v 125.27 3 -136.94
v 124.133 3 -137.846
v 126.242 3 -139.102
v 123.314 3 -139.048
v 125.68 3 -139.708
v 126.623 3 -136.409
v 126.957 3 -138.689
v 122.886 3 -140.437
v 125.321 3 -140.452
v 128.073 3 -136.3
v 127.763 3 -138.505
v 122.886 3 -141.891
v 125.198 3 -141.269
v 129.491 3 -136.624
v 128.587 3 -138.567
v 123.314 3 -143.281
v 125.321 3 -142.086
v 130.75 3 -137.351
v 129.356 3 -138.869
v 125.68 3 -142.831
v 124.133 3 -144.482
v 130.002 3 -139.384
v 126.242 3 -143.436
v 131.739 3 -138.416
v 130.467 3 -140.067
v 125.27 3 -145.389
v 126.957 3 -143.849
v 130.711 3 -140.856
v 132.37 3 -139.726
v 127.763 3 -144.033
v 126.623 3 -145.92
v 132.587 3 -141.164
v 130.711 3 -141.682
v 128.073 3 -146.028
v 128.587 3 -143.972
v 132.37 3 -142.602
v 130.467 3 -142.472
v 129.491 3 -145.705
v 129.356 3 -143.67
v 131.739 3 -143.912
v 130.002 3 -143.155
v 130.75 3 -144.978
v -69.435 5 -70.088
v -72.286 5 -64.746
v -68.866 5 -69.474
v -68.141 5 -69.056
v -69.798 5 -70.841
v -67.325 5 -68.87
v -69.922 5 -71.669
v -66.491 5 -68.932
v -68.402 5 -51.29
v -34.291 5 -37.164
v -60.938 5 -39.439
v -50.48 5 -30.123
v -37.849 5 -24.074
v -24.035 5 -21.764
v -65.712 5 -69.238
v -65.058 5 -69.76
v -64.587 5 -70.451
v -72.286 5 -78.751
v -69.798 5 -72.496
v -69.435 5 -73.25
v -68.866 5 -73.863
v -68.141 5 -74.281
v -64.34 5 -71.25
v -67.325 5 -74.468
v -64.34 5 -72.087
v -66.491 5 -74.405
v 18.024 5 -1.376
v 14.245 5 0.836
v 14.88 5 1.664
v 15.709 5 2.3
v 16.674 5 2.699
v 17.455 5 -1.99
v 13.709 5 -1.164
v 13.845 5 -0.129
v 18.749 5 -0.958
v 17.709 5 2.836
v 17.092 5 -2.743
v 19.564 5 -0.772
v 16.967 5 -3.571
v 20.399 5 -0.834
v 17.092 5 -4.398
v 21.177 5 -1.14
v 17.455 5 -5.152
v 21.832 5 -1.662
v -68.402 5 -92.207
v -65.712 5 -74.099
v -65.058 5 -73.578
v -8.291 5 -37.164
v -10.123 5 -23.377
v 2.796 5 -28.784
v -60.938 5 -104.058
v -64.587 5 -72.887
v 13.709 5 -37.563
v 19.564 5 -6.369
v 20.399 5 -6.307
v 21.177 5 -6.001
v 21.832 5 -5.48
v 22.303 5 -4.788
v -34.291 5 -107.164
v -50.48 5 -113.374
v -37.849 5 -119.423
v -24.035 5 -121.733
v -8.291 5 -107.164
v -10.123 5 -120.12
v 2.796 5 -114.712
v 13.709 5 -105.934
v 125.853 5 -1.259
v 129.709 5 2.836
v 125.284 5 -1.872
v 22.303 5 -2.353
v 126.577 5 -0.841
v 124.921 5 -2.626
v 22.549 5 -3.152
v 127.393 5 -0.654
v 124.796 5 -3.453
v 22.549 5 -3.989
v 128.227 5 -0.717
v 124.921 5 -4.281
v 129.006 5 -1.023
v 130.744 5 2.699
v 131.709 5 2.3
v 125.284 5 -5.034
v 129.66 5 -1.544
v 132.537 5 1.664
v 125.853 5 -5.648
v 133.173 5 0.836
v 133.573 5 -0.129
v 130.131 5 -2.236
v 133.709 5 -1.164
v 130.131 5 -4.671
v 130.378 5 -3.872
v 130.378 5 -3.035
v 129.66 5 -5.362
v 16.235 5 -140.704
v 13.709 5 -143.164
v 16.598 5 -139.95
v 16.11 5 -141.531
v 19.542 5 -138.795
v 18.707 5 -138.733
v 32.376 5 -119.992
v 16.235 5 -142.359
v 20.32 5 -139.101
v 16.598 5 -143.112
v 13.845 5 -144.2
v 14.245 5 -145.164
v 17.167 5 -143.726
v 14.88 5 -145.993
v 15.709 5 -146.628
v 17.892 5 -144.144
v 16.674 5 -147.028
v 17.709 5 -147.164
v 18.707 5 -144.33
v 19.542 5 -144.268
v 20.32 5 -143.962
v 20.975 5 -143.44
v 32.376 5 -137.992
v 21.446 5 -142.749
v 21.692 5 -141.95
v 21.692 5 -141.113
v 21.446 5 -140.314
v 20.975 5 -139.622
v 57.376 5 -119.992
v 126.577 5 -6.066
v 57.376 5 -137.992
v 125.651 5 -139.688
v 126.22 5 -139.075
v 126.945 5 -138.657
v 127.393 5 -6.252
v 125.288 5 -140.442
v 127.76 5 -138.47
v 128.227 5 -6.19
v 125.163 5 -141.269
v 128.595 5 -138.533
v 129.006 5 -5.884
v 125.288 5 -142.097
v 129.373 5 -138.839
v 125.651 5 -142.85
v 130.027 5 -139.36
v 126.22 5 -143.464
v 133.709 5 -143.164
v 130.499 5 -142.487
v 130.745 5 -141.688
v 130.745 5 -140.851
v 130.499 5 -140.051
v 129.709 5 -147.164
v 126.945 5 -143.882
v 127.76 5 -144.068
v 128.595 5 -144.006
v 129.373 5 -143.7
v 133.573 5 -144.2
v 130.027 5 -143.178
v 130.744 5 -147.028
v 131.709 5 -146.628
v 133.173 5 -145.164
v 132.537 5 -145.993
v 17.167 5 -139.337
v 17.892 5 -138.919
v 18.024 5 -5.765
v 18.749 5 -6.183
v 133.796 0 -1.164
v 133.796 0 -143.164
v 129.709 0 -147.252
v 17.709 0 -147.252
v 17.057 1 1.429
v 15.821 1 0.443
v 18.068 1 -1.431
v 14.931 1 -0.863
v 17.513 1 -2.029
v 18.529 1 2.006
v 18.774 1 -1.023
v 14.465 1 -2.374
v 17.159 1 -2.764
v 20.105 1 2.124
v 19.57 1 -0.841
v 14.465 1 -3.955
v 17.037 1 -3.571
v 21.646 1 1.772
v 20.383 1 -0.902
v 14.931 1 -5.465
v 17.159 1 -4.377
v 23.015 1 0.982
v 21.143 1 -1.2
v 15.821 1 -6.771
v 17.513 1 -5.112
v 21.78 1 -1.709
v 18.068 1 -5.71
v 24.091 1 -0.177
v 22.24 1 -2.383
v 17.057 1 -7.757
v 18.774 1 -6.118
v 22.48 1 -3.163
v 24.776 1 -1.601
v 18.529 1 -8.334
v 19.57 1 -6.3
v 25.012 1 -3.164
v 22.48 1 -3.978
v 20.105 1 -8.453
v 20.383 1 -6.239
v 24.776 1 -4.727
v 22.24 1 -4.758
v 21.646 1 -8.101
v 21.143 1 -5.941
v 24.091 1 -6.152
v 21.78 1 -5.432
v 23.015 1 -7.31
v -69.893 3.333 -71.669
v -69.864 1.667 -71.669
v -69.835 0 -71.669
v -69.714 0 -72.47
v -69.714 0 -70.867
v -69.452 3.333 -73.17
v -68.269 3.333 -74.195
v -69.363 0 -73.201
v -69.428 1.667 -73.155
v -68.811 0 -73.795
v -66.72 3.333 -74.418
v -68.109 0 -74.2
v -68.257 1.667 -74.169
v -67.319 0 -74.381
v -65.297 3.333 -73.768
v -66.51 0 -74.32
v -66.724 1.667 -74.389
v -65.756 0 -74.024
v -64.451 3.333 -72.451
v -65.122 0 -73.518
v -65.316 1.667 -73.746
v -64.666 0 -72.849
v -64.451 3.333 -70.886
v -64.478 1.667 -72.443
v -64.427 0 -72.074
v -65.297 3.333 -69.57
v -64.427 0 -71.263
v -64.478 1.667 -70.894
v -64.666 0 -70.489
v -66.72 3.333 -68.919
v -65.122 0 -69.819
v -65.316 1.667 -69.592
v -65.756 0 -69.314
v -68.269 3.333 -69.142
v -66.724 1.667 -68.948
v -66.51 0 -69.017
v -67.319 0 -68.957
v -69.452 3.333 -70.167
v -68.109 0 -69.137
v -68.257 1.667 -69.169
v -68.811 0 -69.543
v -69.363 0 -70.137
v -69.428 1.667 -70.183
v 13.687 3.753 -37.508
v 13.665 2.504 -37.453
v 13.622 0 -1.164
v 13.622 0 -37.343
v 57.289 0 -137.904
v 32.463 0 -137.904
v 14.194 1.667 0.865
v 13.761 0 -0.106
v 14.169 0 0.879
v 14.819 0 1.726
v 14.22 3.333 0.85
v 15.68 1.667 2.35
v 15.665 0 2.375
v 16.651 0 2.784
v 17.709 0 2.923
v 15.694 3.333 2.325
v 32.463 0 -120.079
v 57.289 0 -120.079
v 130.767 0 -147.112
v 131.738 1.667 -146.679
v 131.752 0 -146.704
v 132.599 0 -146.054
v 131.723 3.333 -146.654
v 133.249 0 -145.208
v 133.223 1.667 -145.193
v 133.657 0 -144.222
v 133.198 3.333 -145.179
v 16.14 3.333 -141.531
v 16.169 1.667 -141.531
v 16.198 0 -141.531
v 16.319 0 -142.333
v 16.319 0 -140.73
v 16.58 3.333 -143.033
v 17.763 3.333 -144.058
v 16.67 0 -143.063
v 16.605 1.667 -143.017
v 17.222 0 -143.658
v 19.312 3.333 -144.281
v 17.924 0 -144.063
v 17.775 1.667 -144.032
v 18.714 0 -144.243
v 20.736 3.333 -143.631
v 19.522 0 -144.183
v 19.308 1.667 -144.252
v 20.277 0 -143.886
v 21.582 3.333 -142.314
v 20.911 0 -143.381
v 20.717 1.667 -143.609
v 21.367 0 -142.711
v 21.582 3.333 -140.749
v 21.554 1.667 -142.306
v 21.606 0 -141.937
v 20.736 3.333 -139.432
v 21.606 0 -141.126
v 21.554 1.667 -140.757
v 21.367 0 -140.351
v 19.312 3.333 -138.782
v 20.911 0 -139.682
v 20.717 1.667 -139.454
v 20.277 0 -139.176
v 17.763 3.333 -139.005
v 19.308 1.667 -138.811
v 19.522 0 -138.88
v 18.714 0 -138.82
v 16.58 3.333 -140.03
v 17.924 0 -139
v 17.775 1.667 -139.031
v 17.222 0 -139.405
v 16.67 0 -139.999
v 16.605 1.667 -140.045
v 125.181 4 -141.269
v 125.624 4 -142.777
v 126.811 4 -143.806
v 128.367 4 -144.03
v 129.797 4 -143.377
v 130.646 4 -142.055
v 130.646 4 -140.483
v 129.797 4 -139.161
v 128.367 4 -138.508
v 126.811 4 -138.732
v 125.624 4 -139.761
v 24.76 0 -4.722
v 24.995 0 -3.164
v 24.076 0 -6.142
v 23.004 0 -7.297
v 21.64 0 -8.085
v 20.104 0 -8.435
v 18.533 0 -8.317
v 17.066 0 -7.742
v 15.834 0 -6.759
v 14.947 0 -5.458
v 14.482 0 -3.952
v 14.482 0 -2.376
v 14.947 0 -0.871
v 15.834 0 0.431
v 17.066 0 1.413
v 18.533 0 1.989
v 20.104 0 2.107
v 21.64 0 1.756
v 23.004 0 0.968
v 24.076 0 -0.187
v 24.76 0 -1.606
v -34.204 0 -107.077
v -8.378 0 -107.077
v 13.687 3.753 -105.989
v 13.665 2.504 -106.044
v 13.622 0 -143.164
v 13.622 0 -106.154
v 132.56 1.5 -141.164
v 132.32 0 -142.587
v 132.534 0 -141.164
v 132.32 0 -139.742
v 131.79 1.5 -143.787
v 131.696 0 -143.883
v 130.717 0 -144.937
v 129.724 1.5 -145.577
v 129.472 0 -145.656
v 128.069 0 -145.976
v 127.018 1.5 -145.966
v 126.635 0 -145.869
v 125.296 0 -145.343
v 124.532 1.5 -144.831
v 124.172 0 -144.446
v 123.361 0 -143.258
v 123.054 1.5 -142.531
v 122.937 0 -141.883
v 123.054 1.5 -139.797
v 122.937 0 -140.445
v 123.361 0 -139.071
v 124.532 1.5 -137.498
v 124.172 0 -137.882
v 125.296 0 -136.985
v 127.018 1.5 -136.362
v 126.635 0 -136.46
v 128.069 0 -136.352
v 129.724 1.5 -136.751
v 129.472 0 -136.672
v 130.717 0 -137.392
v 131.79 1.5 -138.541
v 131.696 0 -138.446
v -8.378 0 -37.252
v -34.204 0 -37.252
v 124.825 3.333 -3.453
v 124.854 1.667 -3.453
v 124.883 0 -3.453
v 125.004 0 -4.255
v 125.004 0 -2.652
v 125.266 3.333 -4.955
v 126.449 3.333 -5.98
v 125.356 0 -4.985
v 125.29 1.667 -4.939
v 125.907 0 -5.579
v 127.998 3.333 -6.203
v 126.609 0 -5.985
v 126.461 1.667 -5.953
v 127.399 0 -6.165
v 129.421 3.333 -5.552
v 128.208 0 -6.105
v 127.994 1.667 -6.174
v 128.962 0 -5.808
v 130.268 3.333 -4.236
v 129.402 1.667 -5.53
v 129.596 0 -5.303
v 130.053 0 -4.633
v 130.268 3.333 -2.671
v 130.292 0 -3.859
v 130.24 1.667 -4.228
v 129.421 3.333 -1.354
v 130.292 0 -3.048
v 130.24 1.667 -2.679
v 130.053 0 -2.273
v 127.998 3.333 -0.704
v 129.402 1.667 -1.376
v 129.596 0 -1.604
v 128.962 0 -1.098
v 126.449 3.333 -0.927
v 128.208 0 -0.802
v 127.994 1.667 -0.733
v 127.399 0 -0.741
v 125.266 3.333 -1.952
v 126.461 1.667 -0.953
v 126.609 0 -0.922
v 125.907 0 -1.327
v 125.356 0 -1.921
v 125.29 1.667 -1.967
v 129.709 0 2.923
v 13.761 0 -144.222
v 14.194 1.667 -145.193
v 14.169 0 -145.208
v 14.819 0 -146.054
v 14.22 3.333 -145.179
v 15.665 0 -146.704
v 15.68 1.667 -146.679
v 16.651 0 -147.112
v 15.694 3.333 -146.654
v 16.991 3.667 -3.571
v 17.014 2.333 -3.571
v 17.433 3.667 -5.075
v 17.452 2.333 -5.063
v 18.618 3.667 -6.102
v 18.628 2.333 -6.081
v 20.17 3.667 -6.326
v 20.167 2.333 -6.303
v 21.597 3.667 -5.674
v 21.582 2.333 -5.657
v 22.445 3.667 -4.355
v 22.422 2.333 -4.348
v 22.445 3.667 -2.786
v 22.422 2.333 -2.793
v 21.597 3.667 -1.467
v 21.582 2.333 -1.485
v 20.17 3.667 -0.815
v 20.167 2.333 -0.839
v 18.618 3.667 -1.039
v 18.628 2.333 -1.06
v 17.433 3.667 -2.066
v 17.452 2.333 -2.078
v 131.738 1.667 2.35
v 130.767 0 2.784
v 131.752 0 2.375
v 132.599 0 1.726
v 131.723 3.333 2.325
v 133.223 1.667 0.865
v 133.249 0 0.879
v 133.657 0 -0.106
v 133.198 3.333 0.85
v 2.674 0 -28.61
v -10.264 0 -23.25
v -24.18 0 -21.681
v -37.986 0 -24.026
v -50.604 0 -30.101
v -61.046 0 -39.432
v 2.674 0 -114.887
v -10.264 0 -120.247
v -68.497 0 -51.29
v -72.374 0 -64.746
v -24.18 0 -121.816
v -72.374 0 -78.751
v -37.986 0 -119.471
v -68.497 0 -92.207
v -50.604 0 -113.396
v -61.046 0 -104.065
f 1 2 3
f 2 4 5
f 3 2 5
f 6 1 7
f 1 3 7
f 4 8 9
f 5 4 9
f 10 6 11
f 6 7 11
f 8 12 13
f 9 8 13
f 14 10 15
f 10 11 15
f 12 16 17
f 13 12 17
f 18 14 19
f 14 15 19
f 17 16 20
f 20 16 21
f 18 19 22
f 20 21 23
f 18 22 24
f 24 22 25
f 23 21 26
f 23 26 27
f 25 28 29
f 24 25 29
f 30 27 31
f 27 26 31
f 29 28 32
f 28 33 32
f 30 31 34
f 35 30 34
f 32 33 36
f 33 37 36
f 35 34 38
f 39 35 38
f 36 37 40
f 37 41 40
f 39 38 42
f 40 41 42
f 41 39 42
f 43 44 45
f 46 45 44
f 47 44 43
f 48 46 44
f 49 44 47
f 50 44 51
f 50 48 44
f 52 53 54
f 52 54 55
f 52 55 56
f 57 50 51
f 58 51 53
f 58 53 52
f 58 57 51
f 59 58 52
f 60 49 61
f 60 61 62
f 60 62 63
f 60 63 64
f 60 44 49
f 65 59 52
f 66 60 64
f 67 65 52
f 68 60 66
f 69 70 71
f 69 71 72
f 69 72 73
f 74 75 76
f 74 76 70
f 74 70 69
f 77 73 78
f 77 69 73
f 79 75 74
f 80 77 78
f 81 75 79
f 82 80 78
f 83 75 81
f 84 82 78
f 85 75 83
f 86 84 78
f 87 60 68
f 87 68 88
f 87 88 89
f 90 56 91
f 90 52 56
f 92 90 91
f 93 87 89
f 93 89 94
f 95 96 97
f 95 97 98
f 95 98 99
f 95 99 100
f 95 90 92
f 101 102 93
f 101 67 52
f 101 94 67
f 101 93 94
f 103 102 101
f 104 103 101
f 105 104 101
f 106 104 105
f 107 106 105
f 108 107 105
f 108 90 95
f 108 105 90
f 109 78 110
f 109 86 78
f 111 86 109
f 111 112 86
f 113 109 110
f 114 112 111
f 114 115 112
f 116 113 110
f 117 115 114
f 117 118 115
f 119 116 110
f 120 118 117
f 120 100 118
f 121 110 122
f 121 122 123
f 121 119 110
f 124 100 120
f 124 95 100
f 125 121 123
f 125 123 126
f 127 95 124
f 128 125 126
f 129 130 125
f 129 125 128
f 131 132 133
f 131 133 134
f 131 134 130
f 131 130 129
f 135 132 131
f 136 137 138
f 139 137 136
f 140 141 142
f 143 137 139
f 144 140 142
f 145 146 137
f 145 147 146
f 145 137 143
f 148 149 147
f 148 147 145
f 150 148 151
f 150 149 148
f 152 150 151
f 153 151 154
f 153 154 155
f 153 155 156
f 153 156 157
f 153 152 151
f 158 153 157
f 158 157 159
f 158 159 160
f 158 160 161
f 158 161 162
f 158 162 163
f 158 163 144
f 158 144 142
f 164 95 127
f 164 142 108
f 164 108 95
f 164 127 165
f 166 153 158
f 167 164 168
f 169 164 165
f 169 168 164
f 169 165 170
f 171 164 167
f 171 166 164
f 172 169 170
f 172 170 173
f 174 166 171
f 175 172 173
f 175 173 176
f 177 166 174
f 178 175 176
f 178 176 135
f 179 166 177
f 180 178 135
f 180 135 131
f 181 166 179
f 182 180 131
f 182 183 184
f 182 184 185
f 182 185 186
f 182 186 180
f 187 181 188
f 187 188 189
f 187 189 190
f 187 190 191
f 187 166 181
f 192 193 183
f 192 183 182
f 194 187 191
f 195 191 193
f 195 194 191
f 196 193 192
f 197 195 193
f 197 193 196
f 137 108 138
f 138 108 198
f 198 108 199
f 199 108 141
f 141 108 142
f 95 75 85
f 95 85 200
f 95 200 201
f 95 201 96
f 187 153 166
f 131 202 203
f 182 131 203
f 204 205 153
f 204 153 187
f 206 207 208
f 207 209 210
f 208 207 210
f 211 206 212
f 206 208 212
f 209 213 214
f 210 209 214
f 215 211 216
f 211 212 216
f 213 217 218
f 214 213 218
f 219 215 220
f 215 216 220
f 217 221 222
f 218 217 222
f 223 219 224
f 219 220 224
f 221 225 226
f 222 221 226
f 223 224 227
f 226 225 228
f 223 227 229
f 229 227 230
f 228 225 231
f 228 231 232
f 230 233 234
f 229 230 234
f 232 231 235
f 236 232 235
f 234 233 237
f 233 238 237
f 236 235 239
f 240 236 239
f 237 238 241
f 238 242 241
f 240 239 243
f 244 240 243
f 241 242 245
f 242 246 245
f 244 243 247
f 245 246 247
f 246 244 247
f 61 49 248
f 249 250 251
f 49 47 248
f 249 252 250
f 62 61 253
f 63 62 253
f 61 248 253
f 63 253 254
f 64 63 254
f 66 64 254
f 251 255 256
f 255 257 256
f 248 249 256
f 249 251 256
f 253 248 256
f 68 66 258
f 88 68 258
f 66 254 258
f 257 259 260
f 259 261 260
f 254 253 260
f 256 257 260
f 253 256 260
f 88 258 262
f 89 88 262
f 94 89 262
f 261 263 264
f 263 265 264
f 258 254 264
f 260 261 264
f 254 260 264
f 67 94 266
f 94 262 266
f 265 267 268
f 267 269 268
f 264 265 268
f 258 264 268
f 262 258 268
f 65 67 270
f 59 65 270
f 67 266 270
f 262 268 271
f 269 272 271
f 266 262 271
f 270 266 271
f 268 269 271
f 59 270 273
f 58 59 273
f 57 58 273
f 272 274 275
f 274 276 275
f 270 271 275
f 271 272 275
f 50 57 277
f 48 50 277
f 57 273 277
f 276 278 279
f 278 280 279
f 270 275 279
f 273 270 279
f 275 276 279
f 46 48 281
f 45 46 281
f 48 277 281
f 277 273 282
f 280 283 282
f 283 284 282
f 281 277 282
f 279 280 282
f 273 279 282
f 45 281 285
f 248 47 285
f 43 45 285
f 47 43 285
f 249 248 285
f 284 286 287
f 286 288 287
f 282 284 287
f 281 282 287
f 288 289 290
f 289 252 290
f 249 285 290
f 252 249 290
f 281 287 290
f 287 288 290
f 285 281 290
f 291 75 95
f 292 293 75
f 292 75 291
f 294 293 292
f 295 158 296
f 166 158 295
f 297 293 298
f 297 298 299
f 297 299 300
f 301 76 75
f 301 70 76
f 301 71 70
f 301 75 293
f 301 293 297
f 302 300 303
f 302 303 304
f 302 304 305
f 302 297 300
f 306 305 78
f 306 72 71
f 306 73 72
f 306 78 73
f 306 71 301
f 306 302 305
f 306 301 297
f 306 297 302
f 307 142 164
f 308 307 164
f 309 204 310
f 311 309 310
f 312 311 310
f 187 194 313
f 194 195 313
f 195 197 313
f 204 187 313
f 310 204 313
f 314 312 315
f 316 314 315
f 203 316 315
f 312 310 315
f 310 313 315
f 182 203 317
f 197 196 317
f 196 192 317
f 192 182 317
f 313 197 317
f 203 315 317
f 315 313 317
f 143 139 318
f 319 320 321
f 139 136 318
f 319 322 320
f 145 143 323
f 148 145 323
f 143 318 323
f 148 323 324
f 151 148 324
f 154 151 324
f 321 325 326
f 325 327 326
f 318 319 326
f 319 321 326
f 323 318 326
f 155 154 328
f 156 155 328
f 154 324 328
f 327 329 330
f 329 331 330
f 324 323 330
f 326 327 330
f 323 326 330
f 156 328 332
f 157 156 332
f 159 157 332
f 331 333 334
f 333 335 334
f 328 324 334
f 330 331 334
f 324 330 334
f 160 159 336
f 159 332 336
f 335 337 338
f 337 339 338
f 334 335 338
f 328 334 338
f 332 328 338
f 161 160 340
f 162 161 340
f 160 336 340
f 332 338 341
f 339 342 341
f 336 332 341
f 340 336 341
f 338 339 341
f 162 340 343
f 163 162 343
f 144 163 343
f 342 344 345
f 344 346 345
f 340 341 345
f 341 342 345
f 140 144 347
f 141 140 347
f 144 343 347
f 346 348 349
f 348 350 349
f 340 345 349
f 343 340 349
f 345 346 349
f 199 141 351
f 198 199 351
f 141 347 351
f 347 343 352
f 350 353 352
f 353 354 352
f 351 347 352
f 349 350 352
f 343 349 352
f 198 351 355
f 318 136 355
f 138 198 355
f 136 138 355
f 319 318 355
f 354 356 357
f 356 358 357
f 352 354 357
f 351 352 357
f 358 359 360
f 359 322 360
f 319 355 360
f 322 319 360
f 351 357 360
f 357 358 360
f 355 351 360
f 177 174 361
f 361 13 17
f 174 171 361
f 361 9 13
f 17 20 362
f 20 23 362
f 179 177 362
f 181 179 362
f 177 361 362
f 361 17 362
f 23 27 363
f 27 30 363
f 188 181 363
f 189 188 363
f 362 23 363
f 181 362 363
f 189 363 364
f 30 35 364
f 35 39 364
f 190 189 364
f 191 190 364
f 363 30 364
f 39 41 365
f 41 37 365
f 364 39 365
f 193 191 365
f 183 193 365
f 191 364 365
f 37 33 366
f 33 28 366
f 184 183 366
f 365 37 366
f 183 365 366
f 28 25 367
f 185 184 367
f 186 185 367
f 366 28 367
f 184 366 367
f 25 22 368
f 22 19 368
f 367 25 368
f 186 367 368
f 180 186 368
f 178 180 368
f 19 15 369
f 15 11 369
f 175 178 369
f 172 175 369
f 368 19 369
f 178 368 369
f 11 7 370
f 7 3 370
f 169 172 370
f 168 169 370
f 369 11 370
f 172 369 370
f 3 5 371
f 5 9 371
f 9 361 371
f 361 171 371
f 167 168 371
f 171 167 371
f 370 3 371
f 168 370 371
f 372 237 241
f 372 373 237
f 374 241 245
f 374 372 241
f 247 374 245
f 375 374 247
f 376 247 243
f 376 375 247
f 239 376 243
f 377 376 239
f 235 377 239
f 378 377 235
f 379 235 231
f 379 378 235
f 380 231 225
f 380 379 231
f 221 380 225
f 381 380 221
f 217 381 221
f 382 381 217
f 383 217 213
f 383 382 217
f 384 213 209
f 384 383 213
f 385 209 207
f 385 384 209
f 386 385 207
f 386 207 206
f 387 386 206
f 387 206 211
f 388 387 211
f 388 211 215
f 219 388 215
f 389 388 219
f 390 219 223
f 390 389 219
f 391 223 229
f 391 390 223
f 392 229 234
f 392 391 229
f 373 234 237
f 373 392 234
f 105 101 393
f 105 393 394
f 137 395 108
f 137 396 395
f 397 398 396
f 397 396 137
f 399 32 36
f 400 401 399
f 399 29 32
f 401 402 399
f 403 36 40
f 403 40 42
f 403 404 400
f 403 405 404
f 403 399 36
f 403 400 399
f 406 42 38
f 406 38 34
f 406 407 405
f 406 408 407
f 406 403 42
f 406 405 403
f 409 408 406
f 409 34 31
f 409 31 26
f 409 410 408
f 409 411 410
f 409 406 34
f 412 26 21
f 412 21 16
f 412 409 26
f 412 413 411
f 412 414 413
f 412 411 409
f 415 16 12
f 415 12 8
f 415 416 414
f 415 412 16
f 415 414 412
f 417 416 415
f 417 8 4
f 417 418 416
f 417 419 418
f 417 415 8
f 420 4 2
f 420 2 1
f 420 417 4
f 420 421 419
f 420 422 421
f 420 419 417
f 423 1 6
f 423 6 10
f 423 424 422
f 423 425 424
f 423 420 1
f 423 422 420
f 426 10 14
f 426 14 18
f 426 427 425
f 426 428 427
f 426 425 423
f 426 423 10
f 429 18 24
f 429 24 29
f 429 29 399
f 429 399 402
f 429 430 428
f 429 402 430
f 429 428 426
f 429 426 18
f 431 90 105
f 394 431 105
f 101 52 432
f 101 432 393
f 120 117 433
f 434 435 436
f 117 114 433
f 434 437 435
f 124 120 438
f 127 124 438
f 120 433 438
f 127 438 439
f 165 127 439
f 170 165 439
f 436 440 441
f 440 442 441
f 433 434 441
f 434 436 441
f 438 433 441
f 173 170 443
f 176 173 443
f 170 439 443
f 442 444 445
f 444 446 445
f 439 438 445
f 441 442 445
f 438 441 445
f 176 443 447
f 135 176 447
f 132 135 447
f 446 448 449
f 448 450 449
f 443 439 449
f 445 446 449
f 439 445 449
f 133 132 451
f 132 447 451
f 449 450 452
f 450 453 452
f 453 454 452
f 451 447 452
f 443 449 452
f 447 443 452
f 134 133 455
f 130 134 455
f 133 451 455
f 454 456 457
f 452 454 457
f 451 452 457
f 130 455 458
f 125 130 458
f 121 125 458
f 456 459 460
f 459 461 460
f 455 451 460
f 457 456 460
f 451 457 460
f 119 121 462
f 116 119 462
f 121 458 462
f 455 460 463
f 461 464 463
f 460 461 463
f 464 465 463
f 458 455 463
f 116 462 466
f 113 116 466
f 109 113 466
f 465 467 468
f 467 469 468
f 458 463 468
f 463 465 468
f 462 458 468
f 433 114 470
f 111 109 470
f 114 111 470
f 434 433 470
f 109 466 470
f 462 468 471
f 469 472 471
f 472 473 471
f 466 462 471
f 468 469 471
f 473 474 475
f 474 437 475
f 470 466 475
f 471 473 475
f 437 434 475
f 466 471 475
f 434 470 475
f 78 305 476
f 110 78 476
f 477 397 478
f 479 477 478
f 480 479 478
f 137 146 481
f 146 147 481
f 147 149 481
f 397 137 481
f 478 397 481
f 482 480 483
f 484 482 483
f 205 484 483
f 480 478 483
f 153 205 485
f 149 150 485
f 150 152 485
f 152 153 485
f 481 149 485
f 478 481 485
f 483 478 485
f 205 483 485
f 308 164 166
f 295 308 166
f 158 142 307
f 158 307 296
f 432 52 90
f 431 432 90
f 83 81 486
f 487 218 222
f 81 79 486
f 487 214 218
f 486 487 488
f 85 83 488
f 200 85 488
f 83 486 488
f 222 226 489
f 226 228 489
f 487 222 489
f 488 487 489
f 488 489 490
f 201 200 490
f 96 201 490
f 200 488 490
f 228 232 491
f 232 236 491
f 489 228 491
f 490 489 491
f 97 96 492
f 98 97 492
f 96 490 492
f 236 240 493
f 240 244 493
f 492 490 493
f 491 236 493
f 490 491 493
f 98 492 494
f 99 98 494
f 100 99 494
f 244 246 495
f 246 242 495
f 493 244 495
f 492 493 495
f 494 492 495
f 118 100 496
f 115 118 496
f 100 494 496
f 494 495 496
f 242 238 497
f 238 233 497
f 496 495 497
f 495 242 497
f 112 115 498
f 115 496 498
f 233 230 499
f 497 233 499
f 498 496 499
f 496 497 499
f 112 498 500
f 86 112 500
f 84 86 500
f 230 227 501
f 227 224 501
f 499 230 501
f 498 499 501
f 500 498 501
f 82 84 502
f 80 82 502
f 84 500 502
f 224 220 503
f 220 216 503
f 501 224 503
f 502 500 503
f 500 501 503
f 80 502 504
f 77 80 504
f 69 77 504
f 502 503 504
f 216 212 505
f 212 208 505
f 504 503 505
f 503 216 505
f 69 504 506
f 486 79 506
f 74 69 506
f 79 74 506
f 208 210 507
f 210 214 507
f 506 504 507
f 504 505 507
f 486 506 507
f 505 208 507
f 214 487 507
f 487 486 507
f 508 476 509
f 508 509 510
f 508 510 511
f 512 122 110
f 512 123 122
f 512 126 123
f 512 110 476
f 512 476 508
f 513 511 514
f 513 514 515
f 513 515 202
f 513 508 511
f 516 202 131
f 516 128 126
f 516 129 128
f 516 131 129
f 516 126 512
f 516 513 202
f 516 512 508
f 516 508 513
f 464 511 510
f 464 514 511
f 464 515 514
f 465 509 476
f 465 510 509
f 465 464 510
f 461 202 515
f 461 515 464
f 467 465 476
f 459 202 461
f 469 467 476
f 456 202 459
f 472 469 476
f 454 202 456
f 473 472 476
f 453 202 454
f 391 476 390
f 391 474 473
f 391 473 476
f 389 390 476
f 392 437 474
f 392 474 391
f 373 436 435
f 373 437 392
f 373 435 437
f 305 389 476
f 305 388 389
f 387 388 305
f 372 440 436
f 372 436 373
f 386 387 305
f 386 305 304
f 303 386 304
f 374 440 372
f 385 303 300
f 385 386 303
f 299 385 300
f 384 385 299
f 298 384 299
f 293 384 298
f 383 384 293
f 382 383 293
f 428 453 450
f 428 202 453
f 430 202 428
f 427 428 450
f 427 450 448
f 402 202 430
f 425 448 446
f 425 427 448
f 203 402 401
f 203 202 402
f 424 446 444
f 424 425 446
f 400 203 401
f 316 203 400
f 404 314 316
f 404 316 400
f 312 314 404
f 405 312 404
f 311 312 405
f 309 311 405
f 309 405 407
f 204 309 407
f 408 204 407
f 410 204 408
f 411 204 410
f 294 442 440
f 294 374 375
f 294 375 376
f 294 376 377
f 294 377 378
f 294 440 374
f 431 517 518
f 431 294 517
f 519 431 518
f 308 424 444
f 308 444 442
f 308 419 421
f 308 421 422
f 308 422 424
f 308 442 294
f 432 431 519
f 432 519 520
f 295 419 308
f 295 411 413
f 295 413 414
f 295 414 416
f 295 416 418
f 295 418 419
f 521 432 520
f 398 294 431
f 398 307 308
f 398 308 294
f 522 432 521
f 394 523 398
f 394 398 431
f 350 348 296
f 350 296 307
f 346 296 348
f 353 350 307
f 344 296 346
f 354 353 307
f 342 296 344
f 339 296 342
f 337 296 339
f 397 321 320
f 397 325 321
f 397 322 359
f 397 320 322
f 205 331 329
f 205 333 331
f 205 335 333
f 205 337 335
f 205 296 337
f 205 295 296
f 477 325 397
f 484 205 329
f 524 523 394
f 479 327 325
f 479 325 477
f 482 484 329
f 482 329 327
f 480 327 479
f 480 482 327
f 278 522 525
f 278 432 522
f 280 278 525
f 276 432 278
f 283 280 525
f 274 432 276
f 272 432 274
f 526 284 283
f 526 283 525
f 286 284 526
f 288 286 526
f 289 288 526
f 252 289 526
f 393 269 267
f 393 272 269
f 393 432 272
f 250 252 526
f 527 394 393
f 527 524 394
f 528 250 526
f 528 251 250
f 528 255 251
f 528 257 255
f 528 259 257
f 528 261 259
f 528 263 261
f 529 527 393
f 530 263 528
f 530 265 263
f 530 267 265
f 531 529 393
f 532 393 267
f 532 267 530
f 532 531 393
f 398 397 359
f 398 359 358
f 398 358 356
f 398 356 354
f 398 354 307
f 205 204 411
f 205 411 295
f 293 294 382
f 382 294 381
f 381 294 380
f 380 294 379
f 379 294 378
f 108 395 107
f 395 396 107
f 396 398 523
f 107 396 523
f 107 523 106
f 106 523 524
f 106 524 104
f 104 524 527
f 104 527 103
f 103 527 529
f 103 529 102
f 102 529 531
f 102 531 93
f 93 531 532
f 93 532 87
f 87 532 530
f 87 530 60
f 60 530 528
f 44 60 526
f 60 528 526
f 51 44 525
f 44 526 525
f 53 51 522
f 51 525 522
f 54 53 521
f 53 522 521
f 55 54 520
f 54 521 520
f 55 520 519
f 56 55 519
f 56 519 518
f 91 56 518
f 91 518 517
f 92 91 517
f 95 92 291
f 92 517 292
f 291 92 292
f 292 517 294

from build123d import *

# Parameters (mm, degrees)
SKETCH8_W                      = 120
SKETCH8_H                      = 150
BOSS_EXTRUDE3_DEPTH            = 5
SKETCH9_R                      = 50
BOSS_EXTRUDE4_DEPTH            = 5
BOSS_EXTRUDE8_OUTLINE_R        = 5.460321951
BOSS_EXTRUDE8_DEPTH            = 1
CUT_EXTRUDE9_OUTLINE_R         = 5
CUT_EXTRUDE9_DEPTH             = 3
F_2_0_221_DIAMETER_HOLE1_D     = 5.6134
F_2_0_221_DIAMETER_HOLE1_DEPTH = 8
F_2_0_221_DIAMETER_HOLE1_TIP   = 1.686435499
FILLET3_R                      = 4
SKETCH38_W                     = 26
SKETCH38_H                     = 70
CUT_EXTRUDE10_DEPTH            = 40
SKETCH39_W                     = 25
SKETCH39_H                     = 18
CUT_EXTRUDE11_DEPTH            = 40
DRAFT1_ANGLE                   = 1
DRAFT2_ANGLE                   = 1


# Read off the part's stored shape, not the designer's step: Boss-Extrude8, Cut-Extrude9, Draft5, Draft6
with BuildPart() as part:
    # Sketch8 → Boss-Extrude3 (new body)
    with BuildSketch(Plane(origin=(0, 0, 0), x_dir=(1, 0, 0), z_dir=(0, 1, 0))):
        with Locations((73.708855083, 72.164227744)):
            Rectangle(SKETCH8_W, SKETCH8_H)
    extrude(amount=BOSS_EXTRUDE3_DEPTH)

    # Sketch9 → Boss-Extrude4 (add)
    with BuildSketch(Plane(origin=(0, 0, 0), x_dir=(1, 0, 0), z_dir=(0, 1, 0))):
        with Locations((-22.779007595, 71.748458752)):
            Circle(SKETCH9_R)
    extrude(amount=BOSS_EXTRUDE4_DEPTH)

    # Boss-Extrude8 outline → Boss-Extrude8 (cut)
    with BuildSketch(Plane(origin=(0, 0, 0), x_dir=(1, 0, 0), z_dir=(0, 1, 0))):
        with Locations((19.708855083, 3.164227744)):
            Circle(BOSS_EXTRUDE8_OUTLINE_R)
    extrude(amount=BOSS_EXTRUDE8_DEPTH, mode=Mode.SUBTRACT)

    # Cut-Extrude9 outline → Cut-Extrude9 (cut)
    with BuildSketch(Plane(origin=(0, 0, 0), x_dir=(1, 0, 0), z_dir=(0, 1, 0))):
        with Locations((127.708855083, 141.164227744)):
            Circle(CUT_EXTRUDE9_OUTLINE_R)
    extrude(amount=CUT_EXTRUDE9_DEPTH, mode=Mode.SUBTRACT)

    # #2 (0.221) Diameter Hole1
    with Locations(Plane(origin=(0, 5, 0), x_dir=(1, 0, 0), z_dir=(0, 1, 0))):
        with Locations((18.917123201, 141.531370062), (127.969984407, 141.269223761), (127.602547564, 3.45328248), (19.774147178, 3.570575466), (-67.115618064, 71.668740496)):
            Hole(F_2_0_221_DIAMETER_HOLE1_D / 2, depth=F_2_0_221_DIAMETER_HOLE1_DEPTH)
            with Locations((0, 0, -(F_2_0_221_DIAMETER_HOLE1_DEPTH + F_2_0_221_DIAMETER_HOLE1_TIP / 2))):  # 118° drill point
                Cone(0, F_2_0_221_DIAMETER_HOLE1_D / 2, F_2_0_221_DIAMETER_HOLE1_TIP, mode=Mode.SUBTRACT)

    # Fillet3
    fillet3_edges = [part.edges().sort_by_distance(p)[0] for p in [
        (13.708855083, 2.5, -147.164227744),
        (133.708855083, 2.5, -147.164227744),
        (133.708855083, 2.5, 2.835772256),
        (13.708855083, 2.5, 2.835772256),
    ]]
    fillet(fillet3_edges, radius=FILLET3_R)

    # Sketch38 → Cut-Extrude10 (cut)
    with BuildSketch(Plane(origin=(0, 5, 0), x_dir=(1, 0, 0), z_dir=(0, 1, 0))):
        with Locations((-21.291144917, 72.164227744)):
            Rectangle(SKETCH38_W, SKETCH38_H)
    extrude(amount=-CUT_EXTRUDE10_DEPTH, mode=Mode.SUBTRACT)

    # Sketch39 → Cut-Extrude11 (cut)
    with BuildSketch(Plane(origin=(0, 5, 0), x_dir=(1, 0, 0), z_dir=(0, 1, 0))):
        with Locations((44.875898376, 128.991672485)):
            Rectangle(SKETCH39_W, SKETCH39_H)
    extrude(amount=-CUT_EXTRUDE11_DEPTH, mode=Mode.SUBTRACT)

    # Draft1
    draft1_faces = [part.faces().sort_by_distance(p)[0] for p in [
        (130.409247564, 2.5, -3.45328248),
        (132.537282207, 2.5, 1.664199381),
        (73.708855083, 2.5, 2.835772256),
        (44.875898376, 2.5, -137.991672485),
        (-21.291144917, 2.5, -107.164227744),
        (14.880427958, 2.5, 1.664199381),
        (57.375898376, 2.5, -128.991672485),
        (-34.291144917, 2.5, -72.164227744),
        (32.375898376, 2.5, -128.991672485),
        (133.708855083, 2.5, -72.164227744),
        (130.776684407, 4, -141.269223761),
        (132.537282207, 2.5, -145.992654868),
        (13.708855083, 2.5, -19.363684902),
        (22.580847178, 3, -3.570575466),
        (13.708855083, 2.5, -124.549001593),
        (-8.291144917, 2.5, -72.164227744),
        (-64.308918064, 2.5, -71.668740496),
        (-21.291144917, 2.5, -37.164227744),
        (-72.779007595, 2.5, -71.748458752),
        (21.723823201, 2.5, -141.531370062),
        (14.880427958, 2.5, -145.992654868),
        (44.875898376, 2.5, -119.991672485),
        (73.708855083, 2.5, -147.164227744),
    ]]
    draft(draft1_faces, Plane.ZX.offset(5), DRAFT1_ANGLE)

    # Draft2
    draft2_faces = [part.faces().sort_by_distance(p)[0] for p in [
        (14.248533132, 0.5, -3.164227744),
        (122.708855083, 1.5, -141.164227744),
    ]]
    draft(draft2_faces, Plane(origin=(0, 0, 0), x_dir=(0, 0, -1), z_dir=(0, -1, 0)), DRAFT2_ANGLE)

    # Draft5 outline → Draft5 (revolve)
    with BuildSketch(Plane(origin=(19.708855083, 0, -3.164227744), x_dir=(1, 0, 0), z_dir=(0, 0, 1))):
        Polygon((5.303226367, 1), (5.285771302, 0), (5.460321951, 0), (5.442866886, 1), align=None)
    revolve(axis=Axis((19.708855083, 0, -3.164227744), (0, 1, 0)))

    # Draft6 outline → Draft6 (revolve)
    with BuildSketch(Plane(origin=(127.708855083, 0, -141.164227744), x_dir=(1, 0, 0), z_dir=(0, 0, 1))):
        Polygon((4.877814546, 3), (4.825449351, 0), (5, 0), (4.947634805, 3), align=None)
    revolve(axis=Axis((127.708855083, 0, -141.164227744), (0, 1, 0)))


solid = part.part
